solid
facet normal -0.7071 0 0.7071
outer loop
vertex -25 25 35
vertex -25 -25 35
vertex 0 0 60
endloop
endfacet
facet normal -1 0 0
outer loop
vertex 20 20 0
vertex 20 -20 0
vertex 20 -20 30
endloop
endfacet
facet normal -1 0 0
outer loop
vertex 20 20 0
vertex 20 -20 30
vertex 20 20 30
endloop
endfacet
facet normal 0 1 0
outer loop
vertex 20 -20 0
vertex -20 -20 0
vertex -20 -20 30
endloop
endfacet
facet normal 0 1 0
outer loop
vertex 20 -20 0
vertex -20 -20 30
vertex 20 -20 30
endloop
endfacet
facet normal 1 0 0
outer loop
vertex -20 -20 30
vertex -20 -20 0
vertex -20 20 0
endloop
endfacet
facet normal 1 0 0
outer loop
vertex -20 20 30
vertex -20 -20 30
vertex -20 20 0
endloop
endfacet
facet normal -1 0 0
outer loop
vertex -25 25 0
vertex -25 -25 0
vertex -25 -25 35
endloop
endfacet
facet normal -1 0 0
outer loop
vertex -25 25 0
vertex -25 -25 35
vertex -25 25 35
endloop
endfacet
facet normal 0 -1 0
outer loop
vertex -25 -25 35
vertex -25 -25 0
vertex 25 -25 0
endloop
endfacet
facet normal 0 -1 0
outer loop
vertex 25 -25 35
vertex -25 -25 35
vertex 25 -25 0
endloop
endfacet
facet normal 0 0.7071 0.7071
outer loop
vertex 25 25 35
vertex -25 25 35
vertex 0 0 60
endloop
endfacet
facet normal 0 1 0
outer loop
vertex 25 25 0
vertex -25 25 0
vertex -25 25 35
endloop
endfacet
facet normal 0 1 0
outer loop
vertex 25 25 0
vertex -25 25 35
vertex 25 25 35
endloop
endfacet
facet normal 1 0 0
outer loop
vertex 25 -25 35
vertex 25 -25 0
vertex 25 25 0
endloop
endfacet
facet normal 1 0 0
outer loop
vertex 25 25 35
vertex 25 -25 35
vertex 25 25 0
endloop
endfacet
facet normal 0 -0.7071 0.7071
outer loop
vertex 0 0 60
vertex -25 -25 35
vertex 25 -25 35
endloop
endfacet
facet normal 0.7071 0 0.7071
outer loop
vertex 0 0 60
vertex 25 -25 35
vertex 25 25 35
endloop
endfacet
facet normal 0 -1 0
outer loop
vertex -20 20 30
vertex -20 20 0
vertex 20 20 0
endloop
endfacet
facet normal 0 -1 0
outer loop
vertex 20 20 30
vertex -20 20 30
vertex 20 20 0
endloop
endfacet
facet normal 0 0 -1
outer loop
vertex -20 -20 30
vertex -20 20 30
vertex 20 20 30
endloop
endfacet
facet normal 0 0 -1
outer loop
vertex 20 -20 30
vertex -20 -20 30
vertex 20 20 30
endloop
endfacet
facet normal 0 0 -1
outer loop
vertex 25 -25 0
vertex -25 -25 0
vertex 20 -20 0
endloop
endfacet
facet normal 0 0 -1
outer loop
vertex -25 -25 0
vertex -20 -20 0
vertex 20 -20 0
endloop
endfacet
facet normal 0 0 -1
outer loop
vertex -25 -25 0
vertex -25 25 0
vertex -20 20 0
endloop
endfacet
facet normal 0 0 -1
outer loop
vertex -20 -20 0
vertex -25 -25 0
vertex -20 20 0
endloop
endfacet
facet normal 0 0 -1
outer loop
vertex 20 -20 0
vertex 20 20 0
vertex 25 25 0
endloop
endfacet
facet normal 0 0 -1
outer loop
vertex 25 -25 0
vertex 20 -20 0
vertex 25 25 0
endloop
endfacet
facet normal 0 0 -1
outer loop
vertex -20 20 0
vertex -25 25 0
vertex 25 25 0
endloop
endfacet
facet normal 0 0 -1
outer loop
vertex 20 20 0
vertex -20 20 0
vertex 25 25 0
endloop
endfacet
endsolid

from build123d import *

# Parameters (mm, degrees)
F0_R     = 381
F1_DEPTH = 762
F3_W     = 50
F3_H     = 50
F3_W_2   = 40
F3_H_2   = 40
F4_DEPTH = 30
F5_W     = 50
F5_H     = 50
F5_W_2   = 40
F5_H_2   = 40
F6_DEPTH = 30
F7_SIZE  = 24.99999


# Not quite as in the source:
# - a fillet or chamfer is up to 0.001 mm smaller than in the source, because OpenCascade refuses the exact size


with BuildPart() as f1:
    # F0 (on Top) → F1 (new body)
    with BuildSketch(Plane.XY):
        Circle(F0_R)
    extrude(amount=F1_DEPTH)


with BuildPart() as f4:
    # F3 (on Top) → F4 (new body)
    with BuildSketch(Plane.XY):
        Rectangle(F3_W, F3_H)
        Rectangle(F3_W_2, F3_H_2, mode=Mode.SUBTRACT)
    extrude(amount=F4_DEPTH)

    # F5 (on face) → F6 (join)
    with BuildSketch(Plane.XY.offset(30)):
        Rectangle(F5_W, F5_H)
        Rectangle(F5_W_2, F5_H_2, mode=Mode.SUBTRACT)
        Rectangle(F5_W_2, F5_H_2)
    extrude(amount=F6_DEPTH)

    # F7 (size 25 in the source; OpenCascade refuses exactly that, so slightly less here)
    f7_edges = [f4.edges().sort_by_distance(p)[0] for p in [
        (25, 0, 60),
        (0, 25, 60),
        (-25, 0, 60),
        (0, -25, 60),
    ]]
    chamfer(f7_edges, length=F7_SIZE)


solid = f4.part
